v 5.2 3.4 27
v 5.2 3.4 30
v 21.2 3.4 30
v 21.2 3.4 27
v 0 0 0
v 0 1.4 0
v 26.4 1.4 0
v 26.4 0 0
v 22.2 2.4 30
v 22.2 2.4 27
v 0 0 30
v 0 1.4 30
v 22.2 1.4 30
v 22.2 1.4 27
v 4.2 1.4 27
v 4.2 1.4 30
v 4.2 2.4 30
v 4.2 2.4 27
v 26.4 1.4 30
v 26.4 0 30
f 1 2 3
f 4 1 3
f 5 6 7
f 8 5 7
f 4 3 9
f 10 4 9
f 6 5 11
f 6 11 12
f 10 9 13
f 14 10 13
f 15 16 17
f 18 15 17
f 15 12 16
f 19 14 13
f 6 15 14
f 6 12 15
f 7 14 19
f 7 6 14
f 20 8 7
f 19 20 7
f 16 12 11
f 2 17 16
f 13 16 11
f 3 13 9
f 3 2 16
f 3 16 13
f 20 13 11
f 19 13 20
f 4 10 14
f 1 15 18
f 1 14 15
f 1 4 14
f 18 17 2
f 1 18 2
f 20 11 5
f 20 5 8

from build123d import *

# Parameters (mm, degrees)
SKETCH1_W           = 26.4
SKETCH1_H           = 1.4
BOSS_EXTRUDE1_DEPTH = 30
BOSS_EXTRUDE2_DEPTH = 3


with BuildPart() as part:
    # Sketch1 → Boss-Extrude1 (new body)
    with BuildSketch(Plane.XY):
        with Locations((13.2, 0.7)):
            Rectangle(SKETCH1_W, SKETCH1_H)
    extrude(amount=BOSS_EXTRUDE1_DEPTH)

    # Sketch2 → Boss-Extrude2 (add)
    with BuildSketch(Plane.XY.offset(30)):
        Polygon((4.2, 1.4), (4.2, 2.4), (5.2, 3.4), (21.2, 3.4), (22.2, 2.4), (22.2, 1.4), align=None)
    extrude(amount=-BOSS_EXTRUDE2_DEPTH)


solid = part.part
